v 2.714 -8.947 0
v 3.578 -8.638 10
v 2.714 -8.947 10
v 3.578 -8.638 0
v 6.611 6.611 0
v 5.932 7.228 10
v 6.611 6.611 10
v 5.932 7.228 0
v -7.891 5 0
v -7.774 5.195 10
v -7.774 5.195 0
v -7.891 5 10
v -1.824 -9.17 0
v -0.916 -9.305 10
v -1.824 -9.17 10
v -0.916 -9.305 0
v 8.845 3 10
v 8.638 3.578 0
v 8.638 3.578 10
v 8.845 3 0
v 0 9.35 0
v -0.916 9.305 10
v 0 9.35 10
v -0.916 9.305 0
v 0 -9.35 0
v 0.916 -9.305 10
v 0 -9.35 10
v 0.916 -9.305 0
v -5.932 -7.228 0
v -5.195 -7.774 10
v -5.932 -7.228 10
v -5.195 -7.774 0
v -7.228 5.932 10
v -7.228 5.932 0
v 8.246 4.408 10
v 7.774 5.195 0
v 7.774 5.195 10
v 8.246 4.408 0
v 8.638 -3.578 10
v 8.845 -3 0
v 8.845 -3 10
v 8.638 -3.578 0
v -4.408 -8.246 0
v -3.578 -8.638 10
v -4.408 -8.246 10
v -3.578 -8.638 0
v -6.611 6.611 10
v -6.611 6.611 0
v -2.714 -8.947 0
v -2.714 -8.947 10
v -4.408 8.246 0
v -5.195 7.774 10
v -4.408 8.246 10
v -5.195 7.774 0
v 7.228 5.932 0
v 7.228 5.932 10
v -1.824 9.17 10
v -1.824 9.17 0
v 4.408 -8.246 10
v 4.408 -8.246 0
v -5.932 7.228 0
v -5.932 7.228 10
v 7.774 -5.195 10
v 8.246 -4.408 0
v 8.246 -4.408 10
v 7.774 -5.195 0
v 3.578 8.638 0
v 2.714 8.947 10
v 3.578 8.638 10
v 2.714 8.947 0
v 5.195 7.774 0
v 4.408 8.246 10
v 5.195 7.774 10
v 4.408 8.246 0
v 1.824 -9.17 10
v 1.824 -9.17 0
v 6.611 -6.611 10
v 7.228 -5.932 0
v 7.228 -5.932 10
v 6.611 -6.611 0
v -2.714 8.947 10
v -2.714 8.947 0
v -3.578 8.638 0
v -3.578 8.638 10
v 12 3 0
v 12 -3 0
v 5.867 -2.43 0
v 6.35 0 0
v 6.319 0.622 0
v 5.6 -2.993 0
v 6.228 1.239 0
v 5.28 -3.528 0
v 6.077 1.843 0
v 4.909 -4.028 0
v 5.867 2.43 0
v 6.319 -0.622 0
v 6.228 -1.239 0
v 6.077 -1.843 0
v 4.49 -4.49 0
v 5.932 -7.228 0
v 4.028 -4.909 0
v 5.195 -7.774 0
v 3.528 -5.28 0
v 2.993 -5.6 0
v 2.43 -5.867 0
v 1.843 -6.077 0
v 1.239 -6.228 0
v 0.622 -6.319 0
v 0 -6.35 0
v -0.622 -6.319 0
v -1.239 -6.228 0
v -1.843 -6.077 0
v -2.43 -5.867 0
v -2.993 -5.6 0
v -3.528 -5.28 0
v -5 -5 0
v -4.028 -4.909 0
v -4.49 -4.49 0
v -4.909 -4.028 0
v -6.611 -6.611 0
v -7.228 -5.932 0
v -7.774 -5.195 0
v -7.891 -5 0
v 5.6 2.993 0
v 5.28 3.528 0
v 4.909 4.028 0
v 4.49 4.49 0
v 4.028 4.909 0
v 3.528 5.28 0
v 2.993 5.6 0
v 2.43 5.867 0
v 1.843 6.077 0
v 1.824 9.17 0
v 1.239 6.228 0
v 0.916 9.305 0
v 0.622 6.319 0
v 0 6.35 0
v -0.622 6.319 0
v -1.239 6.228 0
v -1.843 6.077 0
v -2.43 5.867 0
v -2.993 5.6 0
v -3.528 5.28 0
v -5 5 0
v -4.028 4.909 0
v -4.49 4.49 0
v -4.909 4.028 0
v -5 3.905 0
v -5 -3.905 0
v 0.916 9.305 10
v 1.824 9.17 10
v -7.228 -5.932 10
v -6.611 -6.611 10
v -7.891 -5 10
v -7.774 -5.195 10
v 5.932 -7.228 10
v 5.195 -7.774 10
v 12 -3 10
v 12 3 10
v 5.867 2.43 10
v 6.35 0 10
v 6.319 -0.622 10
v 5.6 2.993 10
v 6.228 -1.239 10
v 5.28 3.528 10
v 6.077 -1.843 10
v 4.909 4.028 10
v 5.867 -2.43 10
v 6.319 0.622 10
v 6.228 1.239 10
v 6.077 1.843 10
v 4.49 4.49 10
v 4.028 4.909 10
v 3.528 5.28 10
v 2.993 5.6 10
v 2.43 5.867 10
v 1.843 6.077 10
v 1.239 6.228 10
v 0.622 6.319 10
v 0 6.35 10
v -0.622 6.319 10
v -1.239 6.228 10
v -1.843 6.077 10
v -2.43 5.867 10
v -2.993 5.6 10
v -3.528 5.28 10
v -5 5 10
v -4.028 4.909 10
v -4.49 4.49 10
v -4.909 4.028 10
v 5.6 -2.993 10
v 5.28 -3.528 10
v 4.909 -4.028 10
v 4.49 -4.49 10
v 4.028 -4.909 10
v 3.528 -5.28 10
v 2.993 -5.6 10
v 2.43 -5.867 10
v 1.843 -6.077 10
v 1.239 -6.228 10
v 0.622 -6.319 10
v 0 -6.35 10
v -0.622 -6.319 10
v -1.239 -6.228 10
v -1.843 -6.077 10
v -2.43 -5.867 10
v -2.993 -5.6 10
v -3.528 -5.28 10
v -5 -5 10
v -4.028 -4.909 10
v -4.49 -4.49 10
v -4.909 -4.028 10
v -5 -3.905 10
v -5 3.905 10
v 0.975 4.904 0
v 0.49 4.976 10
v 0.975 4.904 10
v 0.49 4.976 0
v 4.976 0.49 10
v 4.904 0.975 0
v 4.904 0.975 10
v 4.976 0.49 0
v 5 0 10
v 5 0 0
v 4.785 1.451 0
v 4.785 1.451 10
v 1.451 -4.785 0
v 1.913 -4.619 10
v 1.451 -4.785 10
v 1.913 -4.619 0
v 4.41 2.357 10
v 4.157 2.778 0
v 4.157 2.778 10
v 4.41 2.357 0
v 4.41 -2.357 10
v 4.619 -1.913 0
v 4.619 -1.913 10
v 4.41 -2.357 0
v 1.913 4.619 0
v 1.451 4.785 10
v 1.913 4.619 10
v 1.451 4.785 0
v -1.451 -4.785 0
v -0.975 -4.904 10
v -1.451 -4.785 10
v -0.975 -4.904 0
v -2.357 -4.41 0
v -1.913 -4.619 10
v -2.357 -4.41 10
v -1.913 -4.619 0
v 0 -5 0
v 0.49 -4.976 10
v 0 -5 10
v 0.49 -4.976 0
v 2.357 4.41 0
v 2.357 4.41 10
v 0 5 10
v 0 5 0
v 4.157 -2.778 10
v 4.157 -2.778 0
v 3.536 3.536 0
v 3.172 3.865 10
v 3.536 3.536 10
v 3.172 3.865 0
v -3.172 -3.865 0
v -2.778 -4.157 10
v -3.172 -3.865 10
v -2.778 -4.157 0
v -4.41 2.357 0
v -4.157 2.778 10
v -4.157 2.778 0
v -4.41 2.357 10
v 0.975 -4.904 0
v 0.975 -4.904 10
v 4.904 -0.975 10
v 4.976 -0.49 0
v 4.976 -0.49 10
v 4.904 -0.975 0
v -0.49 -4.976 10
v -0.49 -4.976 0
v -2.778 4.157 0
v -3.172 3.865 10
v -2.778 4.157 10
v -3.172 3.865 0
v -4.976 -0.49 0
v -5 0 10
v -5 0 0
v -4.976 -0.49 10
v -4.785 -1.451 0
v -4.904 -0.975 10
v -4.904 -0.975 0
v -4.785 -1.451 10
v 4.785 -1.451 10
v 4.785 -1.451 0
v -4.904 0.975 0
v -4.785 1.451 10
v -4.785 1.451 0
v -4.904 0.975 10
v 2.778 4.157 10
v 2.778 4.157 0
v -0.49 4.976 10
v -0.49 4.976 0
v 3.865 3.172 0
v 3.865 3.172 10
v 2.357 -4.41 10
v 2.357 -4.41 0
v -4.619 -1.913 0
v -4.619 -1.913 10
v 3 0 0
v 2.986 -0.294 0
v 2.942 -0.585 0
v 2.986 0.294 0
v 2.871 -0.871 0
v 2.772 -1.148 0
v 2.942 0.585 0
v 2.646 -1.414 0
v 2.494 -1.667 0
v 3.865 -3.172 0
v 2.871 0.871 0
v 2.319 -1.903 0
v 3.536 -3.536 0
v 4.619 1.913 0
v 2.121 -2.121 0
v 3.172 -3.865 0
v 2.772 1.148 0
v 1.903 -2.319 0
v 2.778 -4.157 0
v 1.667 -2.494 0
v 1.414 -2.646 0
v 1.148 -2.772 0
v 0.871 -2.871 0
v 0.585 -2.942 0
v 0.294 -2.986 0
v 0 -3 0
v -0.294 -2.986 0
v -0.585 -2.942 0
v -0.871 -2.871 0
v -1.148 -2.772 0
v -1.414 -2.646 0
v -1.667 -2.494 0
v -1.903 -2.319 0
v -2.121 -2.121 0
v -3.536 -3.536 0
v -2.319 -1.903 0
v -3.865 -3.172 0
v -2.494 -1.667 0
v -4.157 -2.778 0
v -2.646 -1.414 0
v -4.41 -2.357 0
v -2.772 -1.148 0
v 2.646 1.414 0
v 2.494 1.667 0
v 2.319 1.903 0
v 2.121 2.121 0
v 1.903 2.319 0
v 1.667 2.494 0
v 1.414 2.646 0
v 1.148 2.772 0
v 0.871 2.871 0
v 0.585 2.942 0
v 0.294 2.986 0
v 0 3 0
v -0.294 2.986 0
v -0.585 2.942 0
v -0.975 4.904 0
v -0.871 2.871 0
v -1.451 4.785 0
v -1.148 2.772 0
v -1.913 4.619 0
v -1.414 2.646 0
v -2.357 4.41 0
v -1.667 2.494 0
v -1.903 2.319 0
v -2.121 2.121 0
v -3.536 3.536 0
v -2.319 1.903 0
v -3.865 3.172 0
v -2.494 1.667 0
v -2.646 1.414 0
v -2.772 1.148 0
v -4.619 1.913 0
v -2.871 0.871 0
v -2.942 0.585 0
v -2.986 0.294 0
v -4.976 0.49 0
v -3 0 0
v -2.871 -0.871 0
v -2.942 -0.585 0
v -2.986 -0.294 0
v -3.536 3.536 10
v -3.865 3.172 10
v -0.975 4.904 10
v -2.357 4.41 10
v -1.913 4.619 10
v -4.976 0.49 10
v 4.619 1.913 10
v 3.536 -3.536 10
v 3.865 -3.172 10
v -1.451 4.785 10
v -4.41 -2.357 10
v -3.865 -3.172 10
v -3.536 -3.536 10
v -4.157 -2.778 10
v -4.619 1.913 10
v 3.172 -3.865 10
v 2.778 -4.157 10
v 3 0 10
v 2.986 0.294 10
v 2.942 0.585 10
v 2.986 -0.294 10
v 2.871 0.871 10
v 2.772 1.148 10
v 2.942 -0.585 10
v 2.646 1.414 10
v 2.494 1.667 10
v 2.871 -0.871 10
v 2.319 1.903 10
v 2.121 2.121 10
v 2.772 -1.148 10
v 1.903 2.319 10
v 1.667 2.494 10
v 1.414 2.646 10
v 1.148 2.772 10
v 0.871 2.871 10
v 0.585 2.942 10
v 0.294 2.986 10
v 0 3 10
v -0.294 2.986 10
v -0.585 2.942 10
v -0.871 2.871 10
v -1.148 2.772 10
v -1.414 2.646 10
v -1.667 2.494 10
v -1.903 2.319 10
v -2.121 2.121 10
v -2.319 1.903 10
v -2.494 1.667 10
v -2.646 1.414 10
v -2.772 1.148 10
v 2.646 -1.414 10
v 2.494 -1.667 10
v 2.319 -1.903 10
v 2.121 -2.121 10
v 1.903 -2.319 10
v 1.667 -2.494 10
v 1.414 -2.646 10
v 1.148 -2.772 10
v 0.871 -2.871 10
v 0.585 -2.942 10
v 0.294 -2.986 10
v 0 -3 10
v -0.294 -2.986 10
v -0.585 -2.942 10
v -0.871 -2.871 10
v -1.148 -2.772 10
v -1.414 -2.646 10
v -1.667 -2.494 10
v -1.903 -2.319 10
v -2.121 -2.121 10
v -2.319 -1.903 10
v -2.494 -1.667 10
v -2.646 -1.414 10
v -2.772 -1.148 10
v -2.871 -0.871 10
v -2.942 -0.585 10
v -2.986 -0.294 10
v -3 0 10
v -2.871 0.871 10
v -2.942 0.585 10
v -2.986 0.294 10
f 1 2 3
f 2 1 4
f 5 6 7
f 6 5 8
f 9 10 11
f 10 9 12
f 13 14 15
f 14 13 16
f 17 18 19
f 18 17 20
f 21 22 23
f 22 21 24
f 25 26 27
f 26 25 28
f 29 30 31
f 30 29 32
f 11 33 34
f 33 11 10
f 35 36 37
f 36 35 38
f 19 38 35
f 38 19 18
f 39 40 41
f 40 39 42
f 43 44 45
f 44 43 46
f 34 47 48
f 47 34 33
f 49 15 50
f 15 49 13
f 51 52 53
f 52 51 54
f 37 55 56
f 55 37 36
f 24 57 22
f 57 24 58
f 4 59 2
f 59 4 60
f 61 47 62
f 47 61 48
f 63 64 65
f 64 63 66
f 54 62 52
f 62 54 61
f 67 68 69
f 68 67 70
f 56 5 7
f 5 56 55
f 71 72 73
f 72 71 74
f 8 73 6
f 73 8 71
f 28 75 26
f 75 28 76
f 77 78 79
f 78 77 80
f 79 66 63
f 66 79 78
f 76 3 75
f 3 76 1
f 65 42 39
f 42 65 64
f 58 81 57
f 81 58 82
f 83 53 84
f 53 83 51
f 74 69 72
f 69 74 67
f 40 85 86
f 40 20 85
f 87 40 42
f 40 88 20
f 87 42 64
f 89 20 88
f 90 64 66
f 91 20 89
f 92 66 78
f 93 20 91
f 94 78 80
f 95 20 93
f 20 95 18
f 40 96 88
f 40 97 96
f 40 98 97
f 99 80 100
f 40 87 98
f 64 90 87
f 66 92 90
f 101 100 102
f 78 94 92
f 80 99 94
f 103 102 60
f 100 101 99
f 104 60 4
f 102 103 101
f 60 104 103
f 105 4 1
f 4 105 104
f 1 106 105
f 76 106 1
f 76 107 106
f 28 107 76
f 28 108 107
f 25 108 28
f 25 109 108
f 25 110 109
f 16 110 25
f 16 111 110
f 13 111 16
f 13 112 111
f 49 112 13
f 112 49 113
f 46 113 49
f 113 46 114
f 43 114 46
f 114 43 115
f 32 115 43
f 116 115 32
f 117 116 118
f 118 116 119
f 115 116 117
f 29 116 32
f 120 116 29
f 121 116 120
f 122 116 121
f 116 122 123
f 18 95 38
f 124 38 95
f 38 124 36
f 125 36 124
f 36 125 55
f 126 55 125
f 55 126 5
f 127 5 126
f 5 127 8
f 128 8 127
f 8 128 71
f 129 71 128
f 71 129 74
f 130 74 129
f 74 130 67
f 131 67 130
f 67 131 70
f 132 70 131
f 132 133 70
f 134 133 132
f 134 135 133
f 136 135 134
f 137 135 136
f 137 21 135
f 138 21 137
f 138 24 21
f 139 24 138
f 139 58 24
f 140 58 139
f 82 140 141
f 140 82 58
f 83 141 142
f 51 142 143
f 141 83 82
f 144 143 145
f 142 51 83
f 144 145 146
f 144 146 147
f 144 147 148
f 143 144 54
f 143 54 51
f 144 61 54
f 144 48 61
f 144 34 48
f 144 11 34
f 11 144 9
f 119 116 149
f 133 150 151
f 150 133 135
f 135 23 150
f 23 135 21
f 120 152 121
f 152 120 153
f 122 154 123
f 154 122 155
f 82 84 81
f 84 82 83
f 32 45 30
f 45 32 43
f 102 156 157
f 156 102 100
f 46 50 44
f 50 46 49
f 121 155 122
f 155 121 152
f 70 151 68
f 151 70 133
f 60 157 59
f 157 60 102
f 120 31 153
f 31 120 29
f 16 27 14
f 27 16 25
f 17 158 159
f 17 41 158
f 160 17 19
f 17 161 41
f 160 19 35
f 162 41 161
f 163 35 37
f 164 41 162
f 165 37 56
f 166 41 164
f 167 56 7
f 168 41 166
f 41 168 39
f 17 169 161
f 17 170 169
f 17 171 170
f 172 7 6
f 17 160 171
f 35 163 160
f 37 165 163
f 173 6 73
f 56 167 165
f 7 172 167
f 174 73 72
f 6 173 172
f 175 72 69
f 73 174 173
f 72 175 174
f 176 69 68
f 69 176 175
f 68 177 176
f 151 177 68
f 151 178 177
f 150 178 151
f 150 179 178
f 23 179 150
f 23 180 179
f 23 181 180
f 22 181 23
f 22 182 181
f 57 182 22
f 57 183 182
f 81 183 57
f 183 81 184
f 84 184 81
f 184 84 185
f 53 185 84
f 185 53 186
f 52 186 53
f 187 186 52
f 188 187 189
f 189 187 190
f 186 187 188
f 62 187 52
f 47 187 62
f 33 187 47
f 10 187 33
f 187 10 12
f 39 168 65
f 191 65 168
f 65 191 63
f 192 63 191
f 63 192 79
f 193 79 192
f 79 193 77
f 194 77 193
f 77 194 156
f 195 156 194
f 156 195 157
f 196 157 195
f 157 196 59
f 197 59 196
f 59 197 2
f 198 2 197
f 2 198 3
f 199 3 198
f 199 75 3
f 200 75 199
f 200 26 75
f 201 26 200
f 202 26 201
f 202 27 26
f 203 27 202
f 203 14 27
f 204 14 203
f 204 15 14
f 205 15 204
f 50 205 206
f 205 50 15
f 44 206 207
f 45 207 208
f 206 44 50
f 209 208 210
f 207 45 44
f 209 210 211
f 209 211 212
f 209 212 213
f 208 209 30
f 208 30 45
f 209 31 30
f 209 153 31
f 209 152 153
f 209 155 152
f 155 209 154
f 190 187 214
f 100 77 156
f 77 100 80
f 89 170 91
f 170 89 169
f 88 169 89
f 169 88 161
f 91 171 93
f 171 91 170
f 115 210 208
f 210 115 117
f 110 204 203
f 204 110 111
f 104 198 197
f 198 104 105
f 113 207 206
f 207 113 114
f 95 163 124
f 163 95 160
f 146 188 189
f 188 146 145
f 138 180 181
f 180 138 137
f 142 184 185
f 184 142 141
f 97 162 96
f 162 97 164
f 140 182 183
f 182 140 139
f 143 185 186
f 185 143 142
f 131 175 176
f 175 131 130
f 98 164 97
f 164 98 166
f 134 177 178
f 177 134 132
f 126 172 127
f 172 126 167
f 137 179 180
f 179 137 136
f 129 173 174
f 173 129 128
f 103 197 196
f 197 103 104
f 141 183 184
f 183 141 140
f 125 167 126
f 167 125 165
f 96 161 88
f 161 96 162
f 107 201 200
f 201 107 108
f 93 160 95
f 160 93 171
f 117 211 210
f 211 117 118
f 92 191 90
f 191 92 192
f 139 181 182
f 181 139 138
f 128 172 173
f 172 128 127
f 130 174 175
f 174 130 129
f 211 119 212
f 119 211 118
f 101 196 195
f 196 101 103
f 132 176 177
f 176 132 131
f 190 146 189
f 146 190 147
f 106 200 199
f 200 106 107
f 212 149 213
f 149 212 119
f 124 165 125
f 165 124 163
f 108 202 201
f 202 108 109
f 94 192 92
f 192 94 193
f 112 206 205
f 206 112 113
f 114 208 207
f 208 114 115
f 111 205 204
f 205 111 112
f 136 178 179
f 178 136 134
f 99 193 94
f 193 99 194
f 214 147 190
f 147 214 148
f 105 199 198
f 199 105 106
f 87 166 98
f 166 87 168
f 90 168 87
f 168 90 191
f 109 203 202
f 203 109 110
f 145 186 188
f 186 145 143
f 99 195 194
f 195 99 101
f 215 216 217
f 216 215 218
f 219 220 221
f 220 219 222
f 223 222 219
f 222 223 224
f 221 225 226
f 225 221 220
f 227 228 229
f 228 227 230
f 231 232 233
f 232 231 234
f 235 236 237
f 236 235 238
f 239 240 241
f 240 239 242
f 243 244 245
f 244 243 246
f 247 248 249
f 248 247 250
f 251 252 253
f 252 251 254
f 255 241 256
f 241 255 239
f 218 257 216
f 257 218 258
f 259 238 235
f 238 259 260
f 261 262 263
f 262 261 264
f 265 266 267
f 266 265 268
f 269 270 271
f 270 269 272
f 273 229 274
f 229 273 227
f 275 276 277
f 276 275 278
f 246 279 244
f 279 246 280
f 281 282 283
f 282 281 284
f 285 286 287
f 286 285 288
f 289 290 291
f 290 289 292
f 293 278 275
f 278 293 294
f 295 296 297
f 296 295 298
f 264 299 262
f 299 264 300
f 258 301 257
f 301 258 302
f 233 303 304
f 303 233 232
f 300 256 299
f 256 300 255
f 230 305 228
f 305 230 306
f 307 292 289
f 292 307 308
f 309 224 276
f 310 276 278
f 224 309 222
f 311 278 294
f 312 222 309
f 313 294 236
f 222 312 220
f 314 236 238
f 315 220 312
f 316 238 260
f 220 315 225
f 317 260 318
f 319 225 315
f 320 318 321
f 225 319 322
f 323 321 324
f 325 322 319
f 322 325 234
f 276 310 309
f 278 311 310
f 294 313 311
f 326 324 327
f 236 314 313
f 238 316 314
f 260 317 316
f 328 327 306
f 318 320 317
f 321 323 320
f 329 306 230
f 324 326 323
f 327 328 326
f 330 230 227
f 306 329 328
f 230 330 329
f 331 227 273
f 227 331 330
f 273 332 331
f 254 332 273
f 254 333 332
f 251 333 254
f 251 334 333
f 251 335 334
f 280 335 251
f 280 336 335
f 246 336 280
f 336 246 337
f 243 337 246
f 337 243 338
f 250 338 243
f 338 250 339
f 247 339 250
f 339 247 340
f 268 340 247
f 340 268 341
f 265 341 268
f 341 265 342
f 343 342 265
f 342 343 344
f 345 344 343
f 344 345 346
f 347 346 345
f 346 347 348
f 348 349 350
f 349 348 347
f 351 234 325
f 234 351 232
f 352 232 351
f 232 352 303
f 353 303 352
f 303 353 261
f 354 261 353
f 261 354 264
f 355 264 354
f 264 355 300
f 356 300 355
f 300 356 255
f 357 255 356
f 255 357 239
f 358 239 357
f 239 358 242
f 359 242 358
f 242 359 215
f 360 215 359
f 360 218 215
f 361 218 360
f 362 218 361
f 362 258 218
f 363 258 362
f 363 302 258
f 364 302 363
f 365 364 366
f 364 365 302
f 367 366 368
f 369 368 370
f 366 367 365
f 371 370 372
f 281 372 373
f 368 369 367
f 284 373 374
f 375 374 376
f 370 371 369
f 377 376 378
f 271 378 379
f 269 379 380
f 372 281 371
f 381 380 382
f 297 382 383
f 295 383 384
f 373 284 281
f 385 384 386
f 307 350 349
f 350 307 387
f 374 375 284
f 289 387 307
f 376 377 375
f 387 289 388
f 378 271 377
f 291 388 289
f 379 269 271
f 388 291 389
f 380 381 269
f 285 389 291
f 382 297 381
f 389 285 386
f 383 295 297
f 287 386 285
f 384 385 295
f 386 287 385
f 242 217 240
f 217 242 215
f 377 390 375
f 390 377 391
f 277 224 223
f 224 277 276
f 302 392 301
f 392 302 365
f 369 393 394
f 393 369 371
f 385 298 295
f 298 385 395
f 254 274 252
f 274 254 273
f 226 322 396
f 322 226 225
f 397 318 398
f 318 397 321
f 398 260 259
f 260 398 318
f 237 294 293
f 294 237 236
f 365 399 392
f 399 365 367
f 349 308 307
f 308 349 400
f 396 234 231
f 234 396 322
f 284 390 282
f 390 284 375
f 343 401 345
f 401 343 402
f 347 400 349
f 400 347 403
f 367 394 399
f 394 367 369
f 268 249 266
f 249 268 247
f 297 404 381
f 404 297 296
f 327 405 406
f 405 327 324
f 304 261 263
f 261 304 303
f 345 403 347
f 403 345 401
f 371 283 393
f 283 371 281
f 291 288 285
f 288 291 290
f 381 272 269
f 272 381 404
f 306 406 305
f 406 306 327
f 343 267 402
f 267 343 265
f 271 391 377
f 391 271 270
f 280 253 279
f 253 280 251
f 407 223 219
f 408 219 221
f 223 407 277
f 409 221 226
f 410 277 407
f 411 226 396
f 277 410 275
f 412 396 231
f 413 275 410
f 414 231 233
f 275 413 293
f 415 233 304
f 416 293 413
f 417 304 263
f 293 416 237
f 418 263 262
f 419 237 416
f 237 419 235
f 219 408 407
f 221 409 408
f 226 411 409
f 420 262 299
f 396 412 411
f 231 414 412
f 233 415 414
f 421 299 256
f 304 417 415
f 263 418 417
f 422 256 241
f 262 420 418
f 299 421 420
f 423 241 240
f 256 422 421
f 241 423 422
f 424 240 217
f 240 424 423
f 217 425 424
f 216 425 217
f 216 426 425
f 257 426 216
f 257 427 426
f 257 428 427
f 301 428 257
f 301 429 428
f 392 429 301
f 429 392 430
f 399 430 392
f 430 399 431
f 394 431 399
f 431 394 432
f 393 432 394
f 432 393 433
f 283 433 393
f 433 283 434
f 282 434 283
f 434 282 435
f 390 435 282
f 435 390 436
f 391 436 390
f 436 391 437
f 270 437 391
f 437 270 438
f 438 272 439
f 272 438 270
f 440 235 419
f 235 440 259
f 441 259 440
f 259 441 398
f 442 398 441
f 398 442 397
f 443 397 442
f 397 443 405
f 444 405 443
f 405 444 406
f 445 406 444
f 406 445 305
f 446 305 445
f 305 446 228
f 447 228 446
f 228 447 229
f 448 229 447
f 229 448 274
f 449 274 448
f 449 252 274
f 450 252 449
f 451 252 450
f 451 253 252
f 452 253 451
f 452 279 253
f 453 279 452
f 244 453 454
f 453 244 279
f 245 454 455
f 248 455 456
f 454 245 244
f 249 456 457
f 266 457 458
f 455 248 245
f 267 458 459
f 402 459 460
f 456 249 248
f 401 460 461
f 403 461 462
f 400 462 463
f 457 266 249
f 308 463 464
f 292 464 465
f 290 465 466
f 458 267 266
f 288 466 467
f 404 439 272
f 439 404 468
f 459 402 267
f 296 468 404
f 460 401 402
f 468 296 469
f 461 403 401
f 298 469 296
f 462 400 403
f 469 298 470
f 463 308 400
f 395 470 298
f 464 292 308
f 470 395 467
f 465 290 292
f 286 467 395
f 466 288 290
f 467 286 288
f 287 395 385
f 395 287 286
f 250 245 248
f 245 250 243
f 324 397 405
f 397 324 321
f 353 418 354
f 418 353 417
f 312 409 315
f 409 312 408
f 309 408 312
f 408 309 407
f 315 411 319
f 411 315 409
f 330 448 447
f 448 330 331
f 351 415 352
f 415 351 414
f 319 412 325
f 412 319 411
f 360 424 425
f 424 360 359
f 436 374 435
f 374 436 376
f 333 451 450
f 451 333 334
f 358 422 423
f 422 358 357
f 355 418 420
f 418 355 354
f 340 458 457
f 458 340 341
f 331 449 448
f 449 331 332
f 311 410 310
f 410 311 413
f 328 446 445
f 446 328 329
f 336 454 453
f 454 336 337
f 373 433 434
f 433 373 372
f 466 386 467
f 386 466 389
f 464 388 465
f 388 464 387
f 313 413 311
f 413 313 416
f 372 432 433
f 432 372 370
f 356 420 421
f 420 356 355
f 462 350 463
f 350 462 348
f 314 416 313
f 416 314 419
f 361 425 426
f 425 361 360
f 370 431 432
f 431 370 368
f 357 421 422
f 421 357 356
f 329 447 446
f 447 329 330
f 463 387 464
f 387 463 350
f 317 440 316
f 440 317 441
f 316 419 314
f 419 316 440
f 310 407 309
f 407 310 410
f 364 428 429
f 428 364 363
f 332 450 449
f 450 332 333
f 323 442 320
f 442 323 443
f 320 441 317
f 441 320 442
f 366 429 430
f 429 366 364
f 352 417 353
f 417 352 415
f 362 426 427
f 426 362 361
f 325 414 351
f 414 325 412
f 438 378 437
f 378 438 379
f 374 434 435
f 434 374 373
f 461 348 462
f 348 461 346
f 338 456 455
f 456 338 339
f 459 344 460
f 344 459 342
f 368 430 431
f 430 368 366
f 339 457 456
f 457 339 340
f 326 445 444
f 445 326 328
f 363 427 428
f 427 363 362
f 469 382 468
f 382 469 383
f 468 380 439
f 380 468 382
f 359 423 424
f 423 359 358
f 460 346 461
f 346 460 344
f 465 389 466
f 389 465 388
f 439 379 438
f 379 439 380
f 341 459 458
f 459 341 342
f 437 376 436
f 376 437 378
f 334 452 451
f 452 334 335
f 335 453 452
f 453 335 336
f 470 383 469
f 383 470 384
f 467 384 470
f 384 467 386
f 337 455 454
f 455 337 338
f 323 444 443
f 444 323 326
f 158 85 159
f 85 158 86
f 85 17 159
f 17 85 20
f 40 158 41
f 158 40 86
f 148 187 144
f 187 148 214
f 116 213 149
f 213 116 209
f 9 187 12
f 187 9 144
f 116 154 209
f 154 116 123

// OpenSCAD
// --- Dimensions (mm) ---
rod_inner_dia = 12.7;      // Inner diameter of the rod ring
rod_wall = 3.0;            // Wall thickness of the rod ring
rod_opening_w = 10.0;      // Width of the gap in the rod ring (X-axis span)
rod_opening_h = 10.0;      // Height of the gap in the rod ring (Y-axis span)

tube_inner_dia = 6.0;       // Inner diameter of the tubing ring
tube_wall = 2.0;           // Wall thickness of the tubing ring
tube_opening_w = 4.5;      // Width of the gap in the tubing ring (X-axis span)
tube_opening_h = 4.5;       // Height of the gap in the tubing ring (Y-axis span)

bridge_width_y = 6.0;      // Width of the bridge in the Y direction
bridge_x_start = 8.0;      // Start of the bridge on X axis
bridge_x_end = 12.0;        // End of the bridge on X axis

extrusion_height = 10.0;   // Total Z height of the part

// --- Constants ---
$fn = 64;

// --- Calculations ---
rod_outer_dia = rod_inner_dia + (2 * rod_wall);
tube_outer_dia = tube_inner_dia + (2 * tube_wall);
tube_center_x = 15.0;
tube_center_y = 0.0;

// --- Final Assembly ---
// The entire assembly is translated so that the base sits at Z = 0.
// Since we use center=true for cylinders, we must offset by extrusion_height/2.
translate([0, 0, extrusion_height/2]) {
    difference() {
        // Main Body: Union of the two rings and the bridge
        union() {
            // 1. Rod Ring
            difference() {
                cylinder(d = rod_outer_dia, h = extrusion_height, center = true);
                // Subtract inner hole (extended to ensure clean cut)
                cylinder(d = rod_inner_dia, h = extrusion_height + 2, center = true);
            }

            // 2. Tubing Ring
            difference() {
                cylinder(d = tube_outer_dia, h = extrusion_height, center = true);
                // Subtract inner hole (extended to ensure clean cut)
                cylinder(d = tube_inner_dia, h = extrusion_height + 2, center = true);
            }

            // 3. Solid Bridge
            // Defined as a block between x=8 and x=12, with Y width of 6mm
            translate([(bridge_x_start + bridge_x_end)/2, 0, 0])
                cube([bridge_x_end - bridge_x_start, bridge_width_y, extrusion_height], center = true);
        }

        // --- Subtractions (Openings) ---

        // Rod Ring Opening: x < 0 and -5 < y < 5
        // To ensure it cuts the ring, we make the cube large enough to cover the -X side.
        // The ring's outer radius is 9.35. We cut from x = -10 to x = 0.
        translate([-10, 0, 0])
            cube([10, rod_opening_h, extrusion_height + 2], center = true);

        // Tubing Ring Opening: x > 15 and -2.25 < y < 2.25
        // The tube center is at 15. We cut from x = 15 to x = 20.
        translate([17.5, 0, 0])
            cube([10, tube_opening_h, extrusion_height + 2], center = true);
    }
}

// Note on Geometry:
// The rod ring is centered at (0,0).
// The tubing ring is centered at (15,0).
// The bridge is a solid block between x=8 and x=12.
// The rod ring opening is on the -X side (x < 0).
// The tubing ring opening is on the +X side (x > 15).
// The part is printed flat on the XY plane (Z=0 to Z=10).
